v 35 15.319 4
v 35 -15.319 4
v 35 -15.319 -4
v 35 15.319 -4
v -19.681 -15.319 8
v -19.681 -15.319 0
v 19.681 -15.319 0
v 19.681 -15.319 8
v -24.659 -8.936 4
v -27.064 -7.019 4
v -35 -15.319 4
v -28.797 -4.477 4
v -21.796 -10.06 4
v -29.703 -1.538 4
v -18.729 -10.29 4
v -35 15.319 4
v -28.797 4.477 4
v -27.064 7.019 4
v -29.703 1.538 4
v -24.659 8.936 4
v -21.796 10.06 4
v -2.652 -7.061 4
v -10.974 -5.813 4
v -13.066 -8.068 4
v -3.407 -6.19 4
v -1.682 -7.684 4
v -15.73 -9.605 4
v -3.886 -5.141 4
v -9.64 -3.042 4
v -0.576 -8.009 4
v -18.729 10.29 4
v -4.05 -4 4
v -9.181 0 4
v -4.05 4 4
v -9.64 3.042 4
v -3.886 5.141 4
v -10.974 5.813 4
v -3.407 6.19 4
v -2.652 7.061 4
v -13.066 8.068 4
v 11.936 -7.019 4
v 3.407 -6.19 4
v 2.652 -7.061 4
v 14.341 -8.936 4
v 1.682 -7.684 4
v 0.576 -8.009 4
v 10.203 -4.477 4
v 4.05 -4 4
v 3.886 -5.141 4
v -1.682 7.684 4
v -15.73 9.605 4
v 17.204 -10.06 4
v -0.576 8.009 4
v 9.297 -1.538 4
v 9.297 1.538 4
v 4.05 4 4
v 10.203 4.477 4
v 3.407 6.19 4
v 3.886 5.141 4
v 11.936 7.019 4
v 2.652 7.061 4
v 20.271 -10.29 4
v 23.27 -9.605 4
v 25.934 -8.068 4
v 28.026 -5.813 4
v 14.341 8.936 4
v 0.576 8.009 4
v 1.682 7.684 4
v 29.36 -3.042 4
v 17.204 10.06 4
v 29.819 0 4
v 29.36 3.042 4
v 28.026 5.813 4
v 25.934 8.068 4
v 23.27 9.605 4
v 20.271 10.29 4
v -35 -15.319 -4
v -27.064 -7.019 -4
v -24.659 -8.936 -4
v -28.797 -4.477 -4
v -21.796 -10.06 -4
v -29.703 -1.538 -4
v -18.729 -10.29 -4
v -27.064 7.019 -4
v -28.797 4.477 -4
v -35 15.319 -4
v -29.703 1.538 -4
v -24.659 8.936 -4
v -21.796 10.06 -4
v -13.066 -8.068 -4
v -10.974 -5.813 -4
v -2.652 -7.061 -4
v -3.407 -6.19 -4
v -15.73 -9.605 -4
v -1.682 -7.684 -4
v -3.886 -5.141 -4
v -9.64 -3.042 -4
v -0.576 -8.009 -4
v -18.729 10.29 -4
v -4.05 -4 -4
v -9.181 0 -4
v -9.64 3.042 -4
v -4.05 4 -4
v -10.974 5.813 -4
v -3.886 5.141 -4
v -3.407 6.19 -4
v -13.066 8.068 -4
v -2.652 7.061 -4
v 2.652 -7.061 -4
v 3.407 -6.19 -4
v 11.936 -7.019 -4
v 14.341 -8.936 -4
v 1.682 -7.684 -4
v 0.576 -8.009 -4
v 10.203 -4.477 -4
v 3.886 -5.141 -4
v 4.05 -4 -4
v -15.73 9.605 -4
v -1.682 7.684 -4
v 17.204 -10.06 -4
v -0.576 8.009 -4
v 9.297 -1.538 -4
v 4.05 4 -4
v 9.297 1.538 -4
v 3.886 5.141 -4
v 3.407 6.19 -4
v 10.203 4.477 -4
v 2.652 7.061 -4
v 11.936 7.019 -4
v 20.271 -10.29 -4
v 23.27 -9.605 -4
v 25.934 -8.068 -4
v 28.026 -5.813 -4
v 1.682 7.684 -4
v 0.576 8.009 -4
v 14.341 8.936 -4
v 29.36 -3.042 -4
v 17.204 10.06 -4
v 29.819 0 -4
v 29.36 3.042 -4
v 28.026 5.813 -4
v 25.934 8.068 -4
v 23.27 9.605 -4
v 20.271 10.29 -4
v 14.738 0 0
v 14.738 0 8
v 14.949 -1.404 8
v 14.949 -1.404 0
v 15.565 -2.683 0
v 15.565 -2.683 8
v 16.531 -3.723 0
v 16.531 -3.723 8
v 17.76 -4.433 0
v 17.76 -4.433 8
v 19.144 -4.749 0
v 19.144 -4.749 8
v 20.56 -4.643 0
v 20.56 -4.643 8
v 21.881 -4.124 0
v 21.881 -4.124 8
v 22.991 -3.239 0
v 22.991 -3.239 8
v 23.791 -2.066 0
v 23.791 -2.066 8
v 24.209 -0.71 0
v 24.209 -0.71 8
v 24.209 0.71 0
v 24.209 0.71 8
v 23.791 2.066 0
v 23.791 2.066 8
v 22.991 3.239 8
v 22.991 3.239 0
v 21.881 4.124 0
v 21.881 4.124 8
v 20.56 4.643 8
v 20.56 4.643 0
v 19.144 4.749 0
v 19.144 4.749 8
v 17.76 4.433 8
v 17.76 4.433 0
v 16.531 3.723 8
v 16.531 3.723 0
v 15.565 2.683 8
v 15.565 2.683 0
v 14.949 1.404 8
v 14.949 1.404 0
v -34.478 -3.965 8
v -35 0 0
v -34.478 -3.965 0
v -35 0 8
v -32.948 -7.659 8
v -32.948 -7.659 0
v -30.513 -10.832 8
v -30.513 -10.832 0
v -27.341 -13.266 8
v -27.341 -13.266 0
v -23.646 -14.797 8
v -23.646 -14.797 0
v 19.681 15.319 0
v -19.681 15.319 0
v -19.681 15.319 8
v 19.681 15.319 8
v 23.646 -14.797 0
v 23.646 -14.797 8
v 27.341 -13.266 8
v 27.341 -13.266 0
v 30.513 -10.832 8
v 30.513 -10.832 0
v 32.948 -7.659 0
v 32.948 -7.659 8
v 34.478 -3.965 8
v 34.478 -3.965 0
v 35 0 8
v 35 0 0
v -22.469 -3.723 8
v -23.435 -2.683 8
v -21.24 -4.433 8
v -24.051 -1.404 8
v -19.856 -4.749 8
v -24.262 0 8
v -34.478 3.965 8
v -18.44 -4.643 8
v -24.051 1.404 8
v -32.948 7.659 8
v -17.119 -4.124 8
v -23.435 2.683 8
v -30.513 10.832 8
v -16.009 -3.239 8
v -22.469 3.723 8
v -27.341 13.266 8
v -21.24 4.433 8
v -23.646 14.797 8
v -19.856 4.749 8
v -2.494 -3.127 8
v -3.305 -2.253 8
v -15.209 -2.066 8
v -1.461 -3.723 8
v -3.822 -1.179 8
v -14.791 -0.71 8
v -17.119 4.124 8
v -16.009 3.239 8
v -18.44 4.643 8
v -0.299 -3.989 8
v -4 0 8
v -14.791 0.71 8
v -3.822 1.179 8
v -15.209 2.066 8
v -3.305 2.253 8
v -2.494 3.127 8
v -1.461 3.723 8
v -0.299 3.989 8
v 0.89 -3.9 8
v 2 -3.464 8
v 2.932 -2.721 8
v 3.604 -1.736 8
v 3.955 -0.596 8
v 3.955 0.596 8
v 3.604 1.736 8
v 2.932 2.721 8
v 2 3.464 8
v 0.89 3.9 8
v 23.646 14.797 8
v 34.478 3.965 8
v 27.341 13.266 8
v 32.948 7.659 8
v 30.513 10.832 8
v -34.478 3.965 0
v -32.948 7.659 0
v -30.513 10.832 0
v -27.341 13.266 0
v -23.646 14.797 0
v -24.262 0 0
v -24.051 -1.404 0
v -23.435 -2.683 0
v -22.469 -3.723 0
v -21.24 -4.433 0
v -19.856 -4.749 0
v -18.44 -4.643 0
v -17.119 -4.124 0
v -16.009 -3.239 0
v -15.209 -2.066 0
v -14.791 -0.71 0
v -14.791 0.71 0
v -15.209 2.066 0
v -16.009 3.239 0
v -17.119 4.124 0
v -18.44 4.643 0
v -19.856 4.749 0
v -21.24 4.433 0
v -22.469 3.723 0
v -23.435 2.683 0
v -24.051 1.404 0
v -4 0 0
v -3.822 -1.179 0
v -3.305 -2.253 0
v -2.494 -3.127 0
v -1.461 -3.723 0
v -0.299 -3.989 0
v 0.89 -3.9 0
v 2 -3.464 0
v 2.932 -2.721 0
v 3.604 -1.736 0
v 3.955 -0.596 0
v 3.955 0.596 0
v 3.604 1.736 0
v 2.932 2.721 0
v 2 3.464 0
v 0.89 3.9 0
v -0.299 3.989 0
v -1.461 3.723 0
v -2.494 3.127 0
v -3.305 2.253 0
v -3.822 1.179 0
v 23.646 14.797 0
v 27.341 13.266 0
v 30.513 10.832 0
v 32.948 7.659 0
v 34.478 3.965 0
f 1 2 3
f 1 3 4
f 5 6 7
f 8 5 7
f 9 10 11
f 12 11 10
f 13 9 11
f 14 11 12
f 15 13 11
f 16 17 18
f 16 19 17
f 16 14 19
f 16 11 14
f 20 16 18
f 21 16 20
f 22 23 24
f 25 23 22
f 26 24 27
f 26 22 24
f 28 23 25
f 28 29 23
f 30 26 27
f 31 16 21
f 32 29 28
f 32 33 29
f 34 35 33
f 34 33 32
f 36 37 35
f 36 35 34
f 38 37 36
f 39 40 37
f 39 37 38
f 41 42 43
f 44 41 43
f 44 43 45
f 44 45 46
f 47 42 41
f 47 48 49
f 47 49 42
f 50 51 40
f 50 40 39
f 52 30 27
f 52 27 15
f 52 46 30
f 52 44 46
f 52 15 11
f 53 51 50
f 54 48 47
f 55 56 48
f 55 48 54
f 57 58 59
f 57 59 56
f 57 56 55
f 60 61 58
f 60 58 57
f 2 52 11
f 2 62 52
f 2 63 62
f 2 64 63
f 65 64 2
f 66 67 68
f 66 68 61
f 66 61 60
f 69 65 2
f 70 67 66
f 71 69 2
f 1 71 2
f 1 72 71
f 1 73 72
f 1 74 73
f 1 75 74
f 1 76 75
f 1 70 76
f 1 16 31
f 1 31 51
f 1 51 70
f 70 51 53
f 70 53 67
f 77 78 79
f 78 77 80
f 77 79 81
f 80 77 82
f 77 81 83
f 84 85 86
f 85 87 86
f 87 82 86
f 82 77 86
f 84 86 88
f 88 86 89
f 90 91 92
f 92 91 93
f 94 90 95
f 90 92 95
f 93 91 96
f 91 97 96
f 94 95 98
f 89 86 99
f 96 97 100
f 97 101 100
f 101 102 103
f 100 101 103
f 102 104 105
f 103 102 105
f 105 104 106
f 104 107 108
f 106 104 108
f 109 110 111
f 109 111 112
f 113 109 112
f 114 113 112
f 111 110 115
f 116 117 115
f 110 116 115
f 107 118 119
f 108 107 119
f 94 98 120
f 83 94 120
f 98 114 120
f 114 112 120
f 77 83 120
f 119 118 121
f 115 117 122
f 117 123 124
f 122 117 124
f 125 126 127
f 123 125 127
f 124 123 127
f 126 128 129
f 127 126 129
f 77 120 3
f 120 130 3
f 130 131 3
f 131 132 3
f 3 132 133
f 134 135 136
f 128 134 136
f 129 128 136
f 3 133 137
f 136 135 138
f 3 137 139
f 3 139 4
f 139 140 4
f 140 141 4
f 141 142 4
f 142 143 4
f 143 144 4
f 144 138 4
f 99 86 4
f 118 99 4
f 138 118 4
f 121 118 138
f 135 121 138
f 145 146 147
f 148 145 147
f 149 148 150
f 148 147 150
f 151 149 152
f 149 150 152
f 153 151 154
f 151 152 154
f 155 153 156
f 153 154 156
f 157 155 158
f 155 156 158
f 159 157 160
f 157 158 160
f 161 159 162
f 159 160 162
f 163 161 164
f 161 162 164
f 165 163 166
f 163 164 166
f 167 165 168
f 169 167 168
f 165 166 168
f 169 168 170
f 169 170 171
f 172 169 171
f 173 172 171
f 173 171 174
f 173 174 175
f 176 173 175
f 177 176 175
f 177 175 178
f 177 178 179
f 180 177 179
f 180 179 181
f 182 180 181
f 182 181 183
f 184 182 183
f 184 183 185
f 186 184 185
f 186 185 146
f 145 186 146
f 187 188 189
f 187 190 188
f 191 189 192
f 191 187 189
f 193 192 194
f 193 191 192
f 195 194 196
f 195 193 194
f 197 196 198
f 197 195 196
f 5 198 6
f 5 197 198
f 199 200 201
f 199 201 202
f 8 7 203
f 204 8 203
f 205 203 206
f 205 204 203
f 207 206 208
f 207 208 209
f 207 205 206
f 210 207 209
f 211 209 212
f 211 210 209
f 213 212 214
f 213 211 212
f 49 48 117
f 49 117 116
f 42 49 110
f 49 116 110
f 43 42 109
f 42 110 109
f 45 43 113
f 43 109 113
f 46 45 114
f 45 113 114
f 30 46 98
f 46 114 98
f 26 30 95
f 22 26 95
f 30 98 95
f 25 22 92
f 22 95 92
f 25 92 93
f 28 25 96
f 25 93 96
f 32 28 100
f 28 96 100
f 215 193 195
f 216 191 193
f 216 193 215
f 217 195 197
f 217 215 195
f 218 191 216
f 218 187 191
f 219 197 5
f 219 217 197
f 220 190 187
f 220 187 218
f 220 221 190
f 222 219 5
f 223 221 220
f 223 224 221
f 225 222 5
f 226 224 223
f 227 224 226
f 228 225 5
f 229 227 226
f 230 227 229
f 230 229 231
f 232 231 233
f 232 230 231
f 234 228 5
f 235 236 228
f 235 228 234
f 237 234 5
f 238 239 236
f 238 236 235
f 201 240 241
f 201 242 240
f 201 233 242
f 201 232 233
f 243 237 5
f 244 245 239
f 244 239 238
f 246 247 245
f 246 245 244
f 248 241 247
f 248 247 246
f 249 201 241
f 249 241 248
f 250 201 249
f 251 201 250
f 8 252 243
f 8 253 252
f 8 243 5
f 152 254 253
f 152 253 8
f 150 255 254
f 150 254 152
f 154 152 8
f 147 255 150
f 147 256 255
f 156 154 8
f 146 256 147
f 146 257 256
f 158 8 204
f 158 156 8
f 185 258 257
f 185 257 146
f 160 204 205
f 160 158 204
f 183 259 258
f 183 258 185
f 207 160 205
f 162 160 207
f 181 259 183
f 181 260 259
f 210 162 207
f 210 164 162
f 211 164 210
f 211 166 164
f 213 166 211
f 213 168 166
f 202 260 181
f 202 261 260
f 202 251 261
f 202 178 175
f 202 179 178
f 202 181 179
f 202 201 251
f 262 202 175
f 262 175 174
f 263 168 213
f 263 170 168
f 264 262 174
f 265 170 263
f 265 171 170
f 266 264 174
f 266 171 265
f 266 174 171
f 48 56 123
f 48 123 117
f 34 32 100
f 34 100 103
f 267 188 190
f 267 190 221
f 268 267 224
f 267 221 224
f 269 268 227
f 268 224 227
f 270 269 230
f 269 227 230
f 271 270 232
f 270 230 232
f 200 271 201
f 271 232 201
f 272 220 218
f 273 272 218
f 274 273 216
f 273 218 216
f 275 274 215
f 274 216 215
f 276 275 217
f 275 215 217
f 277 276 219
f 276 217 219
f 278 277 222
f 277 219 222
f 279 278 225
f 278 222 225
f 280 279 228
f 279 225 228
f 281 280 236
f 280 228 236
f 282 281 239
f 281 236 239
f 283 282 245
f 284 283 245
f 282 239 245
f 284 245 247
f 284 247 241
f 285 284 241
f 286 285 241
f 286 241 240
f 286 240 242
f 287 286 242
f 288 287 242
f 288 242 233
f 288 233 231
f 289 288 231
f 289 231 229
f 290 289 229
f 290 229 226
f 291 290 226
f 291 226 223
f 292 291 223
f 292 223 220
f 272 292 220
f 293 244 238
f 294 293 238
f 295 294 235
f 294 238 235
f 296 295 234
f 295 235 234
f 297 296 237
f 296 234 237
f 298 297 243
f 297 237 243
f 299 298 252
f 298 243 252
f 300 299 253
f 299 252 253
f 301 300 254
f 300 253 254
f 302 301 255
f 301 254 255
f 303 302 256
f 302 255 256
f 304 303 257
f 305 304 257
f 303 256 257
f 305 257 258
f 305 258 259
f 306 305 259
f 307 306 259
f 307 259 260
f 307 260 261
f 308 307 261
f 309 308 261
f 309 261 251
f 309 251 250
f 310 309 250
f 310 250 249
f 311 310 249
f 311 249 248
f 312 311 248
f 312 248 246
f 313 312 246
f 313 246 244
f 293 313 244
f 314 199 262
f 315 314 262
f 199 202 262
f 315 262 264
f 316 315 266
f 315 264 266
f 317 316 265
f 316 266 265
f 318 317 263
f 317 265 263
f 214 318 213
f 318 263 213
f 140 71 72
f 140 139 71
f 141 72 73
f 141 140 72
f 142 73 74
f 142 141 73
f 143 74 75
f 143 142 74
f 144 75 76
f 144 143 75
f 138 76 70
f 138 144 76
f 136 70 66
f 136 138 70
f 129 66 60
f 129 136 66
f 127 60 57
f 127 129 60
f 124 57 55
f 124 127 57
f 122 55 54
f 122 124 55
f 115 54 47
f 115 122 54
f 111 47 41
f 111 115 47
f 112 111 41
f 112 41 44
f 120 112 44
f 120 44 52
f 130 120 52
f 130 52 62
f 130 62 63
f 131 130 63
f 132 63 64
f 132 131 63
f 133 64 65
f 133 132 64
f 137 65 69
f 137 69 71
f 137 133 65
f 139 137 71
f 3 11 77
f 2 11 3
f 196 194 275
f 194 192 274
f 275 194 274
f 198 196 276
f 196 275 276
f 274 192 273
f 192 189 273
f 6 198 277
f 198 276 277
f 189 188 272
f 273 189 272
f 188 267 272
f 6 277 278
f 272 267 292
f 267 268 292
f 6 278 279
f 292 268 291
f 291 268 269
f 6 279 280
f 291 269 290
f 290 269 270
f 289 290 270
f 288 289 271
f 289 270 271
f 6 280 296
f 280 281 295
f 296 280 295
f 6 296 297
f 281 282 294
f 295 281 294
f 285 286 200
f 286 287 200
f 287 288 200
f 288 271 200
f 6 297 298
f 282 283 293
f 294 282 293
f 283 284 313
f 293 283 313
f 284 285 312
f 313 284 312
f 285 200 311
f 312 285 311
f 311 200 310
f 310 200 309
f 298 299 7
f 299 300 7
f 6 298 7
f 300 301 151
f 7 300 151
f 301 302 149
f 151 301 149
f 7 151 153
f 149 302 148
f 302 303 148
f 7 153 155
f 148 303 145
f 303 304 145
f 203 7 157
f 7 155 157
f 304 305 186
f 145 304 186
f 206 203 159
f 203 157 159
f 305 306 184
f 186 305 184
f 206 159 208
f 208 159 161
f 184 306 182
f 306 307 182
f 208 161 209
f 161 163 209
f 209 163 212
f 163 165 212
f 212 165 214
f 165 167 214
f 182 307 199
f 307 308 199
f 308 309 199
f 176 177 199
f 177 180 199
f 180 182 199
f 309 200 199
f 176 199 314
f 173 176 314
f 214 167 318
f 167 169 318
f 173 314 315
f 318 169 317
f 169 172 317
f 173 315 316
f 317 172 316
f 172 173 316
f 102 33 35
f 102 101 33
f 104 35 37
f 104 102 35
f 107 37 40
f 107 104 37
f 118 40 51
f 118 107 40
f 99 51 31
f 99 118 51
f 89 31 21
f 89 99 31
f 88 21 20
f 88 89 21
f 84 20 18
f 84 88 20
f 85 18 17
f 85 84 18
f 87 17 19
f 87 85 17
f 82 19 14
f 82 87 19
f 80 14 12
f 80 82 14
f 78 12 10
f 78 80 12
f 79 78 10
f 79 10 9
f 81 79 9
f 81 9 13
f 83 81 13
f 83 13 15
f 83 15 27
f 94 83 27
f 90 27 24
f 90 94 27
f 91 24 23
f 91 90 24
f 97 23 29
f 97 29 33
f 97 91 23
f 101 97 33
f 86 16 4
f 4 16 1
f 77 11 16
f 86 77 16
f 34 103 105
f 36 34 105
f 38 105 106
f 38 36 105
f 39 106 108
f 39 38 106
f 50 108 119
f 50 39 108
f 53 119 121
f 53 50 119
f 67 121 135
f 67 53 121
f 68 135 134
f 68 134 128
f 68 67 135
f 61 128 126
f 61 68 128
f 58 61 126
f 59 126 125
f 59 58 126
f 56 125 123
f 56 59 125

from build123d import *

# Parameters (mm, degrees)
F0_W     = 70
F0_H     = 30.6375
F0_R     = 10.31875
F1_DEPTH = 4
F2_DEPTH = 8
F3_D     = 9.525
F4_D     = 8
F5_R     = 15.31874


# Not quite as in the source:
# - a fillet or chamfer is up to 0.001 mm smaller than in the source, because OpenCascade refuses the exact size
# - a length typed as a fraction of an inch, garbled in the dataset ("3 / 203.2 mm" for 3/8 in), is restored


with BuildPart() as f1:
    # F0 (on Top) → F1 (new body, symmetric)
    with BuildSketch(Plane.XY):
        Rectangle(F0_W, F0_H)
        with Locations((-19.5, 0)):
            Circle(F0_R, mode=Mode.SUBTRACT)
        with BuildLine():
            Line((4.05, 4), (4.05, 0))
            Line((4.05, 0), (4.05, -4))
            ThreePointArc((4.05, -4), (0, -8.05), (-4.05, -4))
            Line((-4.05, -4), (-4.05, 0))
            Line((-4.05, 0), (-4.05, 4))
            ThreePointArc((-4.05, 4), (0, 8.05), (4.05, 4))
        make_face(mode=Mode.SUBTRACT)
        with Locations((19.5, 0)):
            Circle(F0_R, mode=Mode.SUBTRACT)
    extrude(amount=F1_DEPTH, both=True)


with BuildPart() as f2:
    # F0 (on Top) → F2 (new body)
    with BuildSketch(Plane.XY):
        Rectangle(F0_W, F0_H)
        with Locations((-19.5, 0)):
            Circle(F0_R, mode=Mode.SUBTRACT)
        with BuildLine():
            Line((4.05, 4), (4.05, 0))
            Line((4.05, 0), (4.05, -4))
            ThreePointArc((4.05, -4), (0, -8.05), (-4.05, -4))
            Line((-4.05, -4), (-4.05, 0))
            Line((-4.05, 0), (-4.05, 4))
            ThreePointArc((-4.05, 4), (0, 8.05), (4.05, 4))
        make_face(mode=Mode.SUBTRACT)
        with Locations((19.5, 0)):
            Circle(F0_R, mode=Mode.SUBTRACT)
        with Locations((-19.5, 0)):
            Circle(F0_R)
        with BuildLine():
            Line((4.05, -4), (4.05, 0))
            ThreePointArc((4.05, 0), (0, -4.05), (-4.05, 0))
            Line((-4.05, 0), (-4.05, -4))
            ThreePointArc((-4.05, -4), (0, -8.05), (4.05, -4))
        make_face()
        with BuildLine():
            ThreePointArc((-4.05, 0), (0, -4.05), (4.05, 0))
            ThreePointArc((4.05, 0), (0, 4.05), (-4.05, 0))
        make_face()
        with BuildLine():
            ThreePointArc((-4.05, 0), (0, 4.05), (4.05, 0))
            Line((4.05, 0), (4.05, 4))
            ThreePointArc((4.05, 4), (0, 8.05), (-4.05, 4))
            Line((-4.05, 4), (-4.05, 0))
        make_face()
        with Locations((19.5, 0)):
            Circle(F0_R)
    extrude(amount=F2_DEPTH)

    # F3 (through all)
    with Locations(Plane(origin=(0, 0, 0), x_dir=(1, 0, 0), z_dir=(0, 0, -1))):
        with Locations((-19.5, 0), (19.5, 0)):
            Hole(F3_D / 2)

    # F4 (through all)
    with Locations(Plane(origin=(0, 0, 0), x_dir=(1, 0, 0), z_dir=(0, 0, -1))):
        with Locations((0, 0)):
            Hole(F4_D / 2)

    # F5 (radius 15.31875 in the source; OpenCascade refuses exactly that, so slightly less here)
    f5_edges = [f2.edges().sort_by_distance(p)[0] for p in [
        (-35, 15.31875, 4),
        (35, 15.31875, 4),
        (-35, -15.31875, 4),
        (35, -15.31875, 4),
    ]]
    fillet(f5_edges, radius=F5_R)


solid = Compound([f1.part, f2.part])
